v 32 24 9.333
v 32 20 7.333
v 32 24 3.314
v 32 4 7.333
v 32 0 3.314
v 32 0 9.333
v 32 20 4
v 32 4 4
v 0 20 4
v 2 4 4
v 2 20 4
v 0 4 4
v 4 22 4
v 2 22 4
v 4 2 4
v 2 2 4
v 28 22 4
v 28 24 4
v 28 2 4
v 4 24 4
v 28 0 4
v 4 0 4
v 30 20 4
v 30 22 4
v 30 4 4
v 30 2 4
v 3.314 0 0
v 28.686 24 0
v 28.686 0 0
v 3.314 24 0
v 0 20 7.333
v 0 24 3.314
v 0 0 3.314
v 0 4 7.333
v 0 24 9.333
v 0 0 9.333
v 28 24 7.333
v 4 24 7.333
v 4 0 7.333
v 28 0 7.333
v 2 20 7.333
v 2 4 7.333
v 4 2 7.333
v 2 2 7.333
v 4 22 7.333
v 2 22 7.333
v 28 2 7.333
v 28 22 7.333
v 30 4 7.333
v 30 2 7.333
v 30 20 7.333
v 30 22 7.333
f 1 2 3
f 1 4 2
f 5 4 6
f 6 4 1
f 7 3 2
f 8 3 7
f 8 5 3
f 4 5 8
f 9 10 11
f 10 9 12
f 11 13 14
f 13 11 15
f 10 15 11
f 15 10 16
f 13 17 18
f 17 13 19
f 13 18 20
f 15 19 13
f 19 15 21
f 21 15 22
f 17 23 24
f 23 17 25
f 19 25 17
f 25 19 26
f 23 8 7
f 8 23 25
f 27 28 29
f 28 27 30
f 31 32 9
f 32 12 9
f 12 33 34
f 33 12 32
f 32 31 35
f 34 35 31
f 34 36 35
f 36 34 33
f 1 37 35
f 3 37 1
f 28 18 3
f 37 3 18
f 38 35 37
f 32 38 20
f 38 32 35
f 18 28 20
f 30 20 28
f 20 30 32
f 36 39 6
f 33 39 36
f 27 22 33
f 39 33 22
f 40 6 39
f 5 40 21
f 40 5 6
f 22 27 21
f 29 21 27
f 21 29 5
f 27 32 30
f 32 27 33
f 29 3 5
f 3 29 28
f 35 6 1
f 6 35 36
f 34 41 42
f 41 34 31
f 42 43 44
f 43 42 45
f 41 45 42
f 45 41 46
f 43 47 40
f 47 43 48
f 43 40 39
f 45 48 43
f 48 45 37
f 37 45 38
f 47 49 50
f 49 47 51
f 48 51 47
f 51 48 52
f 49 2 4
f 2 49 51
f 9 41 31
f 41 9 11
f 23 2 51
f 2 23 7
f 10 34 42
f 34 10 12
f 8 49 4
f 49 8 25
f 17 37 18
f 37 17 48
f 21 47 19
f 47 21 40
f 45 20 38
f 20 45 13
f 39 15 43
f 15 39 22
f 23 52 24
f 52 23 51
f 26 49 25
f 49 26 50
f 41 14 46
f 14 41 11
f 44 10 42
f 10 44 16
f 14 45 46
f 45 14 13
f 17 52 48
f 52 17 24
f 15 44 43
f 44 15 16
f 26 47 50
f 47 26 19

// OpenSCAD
u=8;
t=2;
h=u/3*2;

// base
difference(){
    cube([4*u,3*u,u/2]);

    translate([0,-.1,-u])
    rotate([0,-45,0])
    cube([u,50,u]);

    translate([4*u,-.1,-u])
    rotate([0,-45,0])
    cube([u,50,u]);
}

// upper
translate ([0,0,u/2])
difference(){
    cube([4*u,3*u,h]);

    // X
    translate([-.1,t*2,0])
    cube([5*u,3*u-4*t,h-t]);
    // Y
    translate([t*2,-.1,0])
    cube([4*u-4*t,4*u,h-t]);
    // Inner
    translate([t,t,0])
    cube([4*u-2*t,3*u-2*t,h-t]);    
}
